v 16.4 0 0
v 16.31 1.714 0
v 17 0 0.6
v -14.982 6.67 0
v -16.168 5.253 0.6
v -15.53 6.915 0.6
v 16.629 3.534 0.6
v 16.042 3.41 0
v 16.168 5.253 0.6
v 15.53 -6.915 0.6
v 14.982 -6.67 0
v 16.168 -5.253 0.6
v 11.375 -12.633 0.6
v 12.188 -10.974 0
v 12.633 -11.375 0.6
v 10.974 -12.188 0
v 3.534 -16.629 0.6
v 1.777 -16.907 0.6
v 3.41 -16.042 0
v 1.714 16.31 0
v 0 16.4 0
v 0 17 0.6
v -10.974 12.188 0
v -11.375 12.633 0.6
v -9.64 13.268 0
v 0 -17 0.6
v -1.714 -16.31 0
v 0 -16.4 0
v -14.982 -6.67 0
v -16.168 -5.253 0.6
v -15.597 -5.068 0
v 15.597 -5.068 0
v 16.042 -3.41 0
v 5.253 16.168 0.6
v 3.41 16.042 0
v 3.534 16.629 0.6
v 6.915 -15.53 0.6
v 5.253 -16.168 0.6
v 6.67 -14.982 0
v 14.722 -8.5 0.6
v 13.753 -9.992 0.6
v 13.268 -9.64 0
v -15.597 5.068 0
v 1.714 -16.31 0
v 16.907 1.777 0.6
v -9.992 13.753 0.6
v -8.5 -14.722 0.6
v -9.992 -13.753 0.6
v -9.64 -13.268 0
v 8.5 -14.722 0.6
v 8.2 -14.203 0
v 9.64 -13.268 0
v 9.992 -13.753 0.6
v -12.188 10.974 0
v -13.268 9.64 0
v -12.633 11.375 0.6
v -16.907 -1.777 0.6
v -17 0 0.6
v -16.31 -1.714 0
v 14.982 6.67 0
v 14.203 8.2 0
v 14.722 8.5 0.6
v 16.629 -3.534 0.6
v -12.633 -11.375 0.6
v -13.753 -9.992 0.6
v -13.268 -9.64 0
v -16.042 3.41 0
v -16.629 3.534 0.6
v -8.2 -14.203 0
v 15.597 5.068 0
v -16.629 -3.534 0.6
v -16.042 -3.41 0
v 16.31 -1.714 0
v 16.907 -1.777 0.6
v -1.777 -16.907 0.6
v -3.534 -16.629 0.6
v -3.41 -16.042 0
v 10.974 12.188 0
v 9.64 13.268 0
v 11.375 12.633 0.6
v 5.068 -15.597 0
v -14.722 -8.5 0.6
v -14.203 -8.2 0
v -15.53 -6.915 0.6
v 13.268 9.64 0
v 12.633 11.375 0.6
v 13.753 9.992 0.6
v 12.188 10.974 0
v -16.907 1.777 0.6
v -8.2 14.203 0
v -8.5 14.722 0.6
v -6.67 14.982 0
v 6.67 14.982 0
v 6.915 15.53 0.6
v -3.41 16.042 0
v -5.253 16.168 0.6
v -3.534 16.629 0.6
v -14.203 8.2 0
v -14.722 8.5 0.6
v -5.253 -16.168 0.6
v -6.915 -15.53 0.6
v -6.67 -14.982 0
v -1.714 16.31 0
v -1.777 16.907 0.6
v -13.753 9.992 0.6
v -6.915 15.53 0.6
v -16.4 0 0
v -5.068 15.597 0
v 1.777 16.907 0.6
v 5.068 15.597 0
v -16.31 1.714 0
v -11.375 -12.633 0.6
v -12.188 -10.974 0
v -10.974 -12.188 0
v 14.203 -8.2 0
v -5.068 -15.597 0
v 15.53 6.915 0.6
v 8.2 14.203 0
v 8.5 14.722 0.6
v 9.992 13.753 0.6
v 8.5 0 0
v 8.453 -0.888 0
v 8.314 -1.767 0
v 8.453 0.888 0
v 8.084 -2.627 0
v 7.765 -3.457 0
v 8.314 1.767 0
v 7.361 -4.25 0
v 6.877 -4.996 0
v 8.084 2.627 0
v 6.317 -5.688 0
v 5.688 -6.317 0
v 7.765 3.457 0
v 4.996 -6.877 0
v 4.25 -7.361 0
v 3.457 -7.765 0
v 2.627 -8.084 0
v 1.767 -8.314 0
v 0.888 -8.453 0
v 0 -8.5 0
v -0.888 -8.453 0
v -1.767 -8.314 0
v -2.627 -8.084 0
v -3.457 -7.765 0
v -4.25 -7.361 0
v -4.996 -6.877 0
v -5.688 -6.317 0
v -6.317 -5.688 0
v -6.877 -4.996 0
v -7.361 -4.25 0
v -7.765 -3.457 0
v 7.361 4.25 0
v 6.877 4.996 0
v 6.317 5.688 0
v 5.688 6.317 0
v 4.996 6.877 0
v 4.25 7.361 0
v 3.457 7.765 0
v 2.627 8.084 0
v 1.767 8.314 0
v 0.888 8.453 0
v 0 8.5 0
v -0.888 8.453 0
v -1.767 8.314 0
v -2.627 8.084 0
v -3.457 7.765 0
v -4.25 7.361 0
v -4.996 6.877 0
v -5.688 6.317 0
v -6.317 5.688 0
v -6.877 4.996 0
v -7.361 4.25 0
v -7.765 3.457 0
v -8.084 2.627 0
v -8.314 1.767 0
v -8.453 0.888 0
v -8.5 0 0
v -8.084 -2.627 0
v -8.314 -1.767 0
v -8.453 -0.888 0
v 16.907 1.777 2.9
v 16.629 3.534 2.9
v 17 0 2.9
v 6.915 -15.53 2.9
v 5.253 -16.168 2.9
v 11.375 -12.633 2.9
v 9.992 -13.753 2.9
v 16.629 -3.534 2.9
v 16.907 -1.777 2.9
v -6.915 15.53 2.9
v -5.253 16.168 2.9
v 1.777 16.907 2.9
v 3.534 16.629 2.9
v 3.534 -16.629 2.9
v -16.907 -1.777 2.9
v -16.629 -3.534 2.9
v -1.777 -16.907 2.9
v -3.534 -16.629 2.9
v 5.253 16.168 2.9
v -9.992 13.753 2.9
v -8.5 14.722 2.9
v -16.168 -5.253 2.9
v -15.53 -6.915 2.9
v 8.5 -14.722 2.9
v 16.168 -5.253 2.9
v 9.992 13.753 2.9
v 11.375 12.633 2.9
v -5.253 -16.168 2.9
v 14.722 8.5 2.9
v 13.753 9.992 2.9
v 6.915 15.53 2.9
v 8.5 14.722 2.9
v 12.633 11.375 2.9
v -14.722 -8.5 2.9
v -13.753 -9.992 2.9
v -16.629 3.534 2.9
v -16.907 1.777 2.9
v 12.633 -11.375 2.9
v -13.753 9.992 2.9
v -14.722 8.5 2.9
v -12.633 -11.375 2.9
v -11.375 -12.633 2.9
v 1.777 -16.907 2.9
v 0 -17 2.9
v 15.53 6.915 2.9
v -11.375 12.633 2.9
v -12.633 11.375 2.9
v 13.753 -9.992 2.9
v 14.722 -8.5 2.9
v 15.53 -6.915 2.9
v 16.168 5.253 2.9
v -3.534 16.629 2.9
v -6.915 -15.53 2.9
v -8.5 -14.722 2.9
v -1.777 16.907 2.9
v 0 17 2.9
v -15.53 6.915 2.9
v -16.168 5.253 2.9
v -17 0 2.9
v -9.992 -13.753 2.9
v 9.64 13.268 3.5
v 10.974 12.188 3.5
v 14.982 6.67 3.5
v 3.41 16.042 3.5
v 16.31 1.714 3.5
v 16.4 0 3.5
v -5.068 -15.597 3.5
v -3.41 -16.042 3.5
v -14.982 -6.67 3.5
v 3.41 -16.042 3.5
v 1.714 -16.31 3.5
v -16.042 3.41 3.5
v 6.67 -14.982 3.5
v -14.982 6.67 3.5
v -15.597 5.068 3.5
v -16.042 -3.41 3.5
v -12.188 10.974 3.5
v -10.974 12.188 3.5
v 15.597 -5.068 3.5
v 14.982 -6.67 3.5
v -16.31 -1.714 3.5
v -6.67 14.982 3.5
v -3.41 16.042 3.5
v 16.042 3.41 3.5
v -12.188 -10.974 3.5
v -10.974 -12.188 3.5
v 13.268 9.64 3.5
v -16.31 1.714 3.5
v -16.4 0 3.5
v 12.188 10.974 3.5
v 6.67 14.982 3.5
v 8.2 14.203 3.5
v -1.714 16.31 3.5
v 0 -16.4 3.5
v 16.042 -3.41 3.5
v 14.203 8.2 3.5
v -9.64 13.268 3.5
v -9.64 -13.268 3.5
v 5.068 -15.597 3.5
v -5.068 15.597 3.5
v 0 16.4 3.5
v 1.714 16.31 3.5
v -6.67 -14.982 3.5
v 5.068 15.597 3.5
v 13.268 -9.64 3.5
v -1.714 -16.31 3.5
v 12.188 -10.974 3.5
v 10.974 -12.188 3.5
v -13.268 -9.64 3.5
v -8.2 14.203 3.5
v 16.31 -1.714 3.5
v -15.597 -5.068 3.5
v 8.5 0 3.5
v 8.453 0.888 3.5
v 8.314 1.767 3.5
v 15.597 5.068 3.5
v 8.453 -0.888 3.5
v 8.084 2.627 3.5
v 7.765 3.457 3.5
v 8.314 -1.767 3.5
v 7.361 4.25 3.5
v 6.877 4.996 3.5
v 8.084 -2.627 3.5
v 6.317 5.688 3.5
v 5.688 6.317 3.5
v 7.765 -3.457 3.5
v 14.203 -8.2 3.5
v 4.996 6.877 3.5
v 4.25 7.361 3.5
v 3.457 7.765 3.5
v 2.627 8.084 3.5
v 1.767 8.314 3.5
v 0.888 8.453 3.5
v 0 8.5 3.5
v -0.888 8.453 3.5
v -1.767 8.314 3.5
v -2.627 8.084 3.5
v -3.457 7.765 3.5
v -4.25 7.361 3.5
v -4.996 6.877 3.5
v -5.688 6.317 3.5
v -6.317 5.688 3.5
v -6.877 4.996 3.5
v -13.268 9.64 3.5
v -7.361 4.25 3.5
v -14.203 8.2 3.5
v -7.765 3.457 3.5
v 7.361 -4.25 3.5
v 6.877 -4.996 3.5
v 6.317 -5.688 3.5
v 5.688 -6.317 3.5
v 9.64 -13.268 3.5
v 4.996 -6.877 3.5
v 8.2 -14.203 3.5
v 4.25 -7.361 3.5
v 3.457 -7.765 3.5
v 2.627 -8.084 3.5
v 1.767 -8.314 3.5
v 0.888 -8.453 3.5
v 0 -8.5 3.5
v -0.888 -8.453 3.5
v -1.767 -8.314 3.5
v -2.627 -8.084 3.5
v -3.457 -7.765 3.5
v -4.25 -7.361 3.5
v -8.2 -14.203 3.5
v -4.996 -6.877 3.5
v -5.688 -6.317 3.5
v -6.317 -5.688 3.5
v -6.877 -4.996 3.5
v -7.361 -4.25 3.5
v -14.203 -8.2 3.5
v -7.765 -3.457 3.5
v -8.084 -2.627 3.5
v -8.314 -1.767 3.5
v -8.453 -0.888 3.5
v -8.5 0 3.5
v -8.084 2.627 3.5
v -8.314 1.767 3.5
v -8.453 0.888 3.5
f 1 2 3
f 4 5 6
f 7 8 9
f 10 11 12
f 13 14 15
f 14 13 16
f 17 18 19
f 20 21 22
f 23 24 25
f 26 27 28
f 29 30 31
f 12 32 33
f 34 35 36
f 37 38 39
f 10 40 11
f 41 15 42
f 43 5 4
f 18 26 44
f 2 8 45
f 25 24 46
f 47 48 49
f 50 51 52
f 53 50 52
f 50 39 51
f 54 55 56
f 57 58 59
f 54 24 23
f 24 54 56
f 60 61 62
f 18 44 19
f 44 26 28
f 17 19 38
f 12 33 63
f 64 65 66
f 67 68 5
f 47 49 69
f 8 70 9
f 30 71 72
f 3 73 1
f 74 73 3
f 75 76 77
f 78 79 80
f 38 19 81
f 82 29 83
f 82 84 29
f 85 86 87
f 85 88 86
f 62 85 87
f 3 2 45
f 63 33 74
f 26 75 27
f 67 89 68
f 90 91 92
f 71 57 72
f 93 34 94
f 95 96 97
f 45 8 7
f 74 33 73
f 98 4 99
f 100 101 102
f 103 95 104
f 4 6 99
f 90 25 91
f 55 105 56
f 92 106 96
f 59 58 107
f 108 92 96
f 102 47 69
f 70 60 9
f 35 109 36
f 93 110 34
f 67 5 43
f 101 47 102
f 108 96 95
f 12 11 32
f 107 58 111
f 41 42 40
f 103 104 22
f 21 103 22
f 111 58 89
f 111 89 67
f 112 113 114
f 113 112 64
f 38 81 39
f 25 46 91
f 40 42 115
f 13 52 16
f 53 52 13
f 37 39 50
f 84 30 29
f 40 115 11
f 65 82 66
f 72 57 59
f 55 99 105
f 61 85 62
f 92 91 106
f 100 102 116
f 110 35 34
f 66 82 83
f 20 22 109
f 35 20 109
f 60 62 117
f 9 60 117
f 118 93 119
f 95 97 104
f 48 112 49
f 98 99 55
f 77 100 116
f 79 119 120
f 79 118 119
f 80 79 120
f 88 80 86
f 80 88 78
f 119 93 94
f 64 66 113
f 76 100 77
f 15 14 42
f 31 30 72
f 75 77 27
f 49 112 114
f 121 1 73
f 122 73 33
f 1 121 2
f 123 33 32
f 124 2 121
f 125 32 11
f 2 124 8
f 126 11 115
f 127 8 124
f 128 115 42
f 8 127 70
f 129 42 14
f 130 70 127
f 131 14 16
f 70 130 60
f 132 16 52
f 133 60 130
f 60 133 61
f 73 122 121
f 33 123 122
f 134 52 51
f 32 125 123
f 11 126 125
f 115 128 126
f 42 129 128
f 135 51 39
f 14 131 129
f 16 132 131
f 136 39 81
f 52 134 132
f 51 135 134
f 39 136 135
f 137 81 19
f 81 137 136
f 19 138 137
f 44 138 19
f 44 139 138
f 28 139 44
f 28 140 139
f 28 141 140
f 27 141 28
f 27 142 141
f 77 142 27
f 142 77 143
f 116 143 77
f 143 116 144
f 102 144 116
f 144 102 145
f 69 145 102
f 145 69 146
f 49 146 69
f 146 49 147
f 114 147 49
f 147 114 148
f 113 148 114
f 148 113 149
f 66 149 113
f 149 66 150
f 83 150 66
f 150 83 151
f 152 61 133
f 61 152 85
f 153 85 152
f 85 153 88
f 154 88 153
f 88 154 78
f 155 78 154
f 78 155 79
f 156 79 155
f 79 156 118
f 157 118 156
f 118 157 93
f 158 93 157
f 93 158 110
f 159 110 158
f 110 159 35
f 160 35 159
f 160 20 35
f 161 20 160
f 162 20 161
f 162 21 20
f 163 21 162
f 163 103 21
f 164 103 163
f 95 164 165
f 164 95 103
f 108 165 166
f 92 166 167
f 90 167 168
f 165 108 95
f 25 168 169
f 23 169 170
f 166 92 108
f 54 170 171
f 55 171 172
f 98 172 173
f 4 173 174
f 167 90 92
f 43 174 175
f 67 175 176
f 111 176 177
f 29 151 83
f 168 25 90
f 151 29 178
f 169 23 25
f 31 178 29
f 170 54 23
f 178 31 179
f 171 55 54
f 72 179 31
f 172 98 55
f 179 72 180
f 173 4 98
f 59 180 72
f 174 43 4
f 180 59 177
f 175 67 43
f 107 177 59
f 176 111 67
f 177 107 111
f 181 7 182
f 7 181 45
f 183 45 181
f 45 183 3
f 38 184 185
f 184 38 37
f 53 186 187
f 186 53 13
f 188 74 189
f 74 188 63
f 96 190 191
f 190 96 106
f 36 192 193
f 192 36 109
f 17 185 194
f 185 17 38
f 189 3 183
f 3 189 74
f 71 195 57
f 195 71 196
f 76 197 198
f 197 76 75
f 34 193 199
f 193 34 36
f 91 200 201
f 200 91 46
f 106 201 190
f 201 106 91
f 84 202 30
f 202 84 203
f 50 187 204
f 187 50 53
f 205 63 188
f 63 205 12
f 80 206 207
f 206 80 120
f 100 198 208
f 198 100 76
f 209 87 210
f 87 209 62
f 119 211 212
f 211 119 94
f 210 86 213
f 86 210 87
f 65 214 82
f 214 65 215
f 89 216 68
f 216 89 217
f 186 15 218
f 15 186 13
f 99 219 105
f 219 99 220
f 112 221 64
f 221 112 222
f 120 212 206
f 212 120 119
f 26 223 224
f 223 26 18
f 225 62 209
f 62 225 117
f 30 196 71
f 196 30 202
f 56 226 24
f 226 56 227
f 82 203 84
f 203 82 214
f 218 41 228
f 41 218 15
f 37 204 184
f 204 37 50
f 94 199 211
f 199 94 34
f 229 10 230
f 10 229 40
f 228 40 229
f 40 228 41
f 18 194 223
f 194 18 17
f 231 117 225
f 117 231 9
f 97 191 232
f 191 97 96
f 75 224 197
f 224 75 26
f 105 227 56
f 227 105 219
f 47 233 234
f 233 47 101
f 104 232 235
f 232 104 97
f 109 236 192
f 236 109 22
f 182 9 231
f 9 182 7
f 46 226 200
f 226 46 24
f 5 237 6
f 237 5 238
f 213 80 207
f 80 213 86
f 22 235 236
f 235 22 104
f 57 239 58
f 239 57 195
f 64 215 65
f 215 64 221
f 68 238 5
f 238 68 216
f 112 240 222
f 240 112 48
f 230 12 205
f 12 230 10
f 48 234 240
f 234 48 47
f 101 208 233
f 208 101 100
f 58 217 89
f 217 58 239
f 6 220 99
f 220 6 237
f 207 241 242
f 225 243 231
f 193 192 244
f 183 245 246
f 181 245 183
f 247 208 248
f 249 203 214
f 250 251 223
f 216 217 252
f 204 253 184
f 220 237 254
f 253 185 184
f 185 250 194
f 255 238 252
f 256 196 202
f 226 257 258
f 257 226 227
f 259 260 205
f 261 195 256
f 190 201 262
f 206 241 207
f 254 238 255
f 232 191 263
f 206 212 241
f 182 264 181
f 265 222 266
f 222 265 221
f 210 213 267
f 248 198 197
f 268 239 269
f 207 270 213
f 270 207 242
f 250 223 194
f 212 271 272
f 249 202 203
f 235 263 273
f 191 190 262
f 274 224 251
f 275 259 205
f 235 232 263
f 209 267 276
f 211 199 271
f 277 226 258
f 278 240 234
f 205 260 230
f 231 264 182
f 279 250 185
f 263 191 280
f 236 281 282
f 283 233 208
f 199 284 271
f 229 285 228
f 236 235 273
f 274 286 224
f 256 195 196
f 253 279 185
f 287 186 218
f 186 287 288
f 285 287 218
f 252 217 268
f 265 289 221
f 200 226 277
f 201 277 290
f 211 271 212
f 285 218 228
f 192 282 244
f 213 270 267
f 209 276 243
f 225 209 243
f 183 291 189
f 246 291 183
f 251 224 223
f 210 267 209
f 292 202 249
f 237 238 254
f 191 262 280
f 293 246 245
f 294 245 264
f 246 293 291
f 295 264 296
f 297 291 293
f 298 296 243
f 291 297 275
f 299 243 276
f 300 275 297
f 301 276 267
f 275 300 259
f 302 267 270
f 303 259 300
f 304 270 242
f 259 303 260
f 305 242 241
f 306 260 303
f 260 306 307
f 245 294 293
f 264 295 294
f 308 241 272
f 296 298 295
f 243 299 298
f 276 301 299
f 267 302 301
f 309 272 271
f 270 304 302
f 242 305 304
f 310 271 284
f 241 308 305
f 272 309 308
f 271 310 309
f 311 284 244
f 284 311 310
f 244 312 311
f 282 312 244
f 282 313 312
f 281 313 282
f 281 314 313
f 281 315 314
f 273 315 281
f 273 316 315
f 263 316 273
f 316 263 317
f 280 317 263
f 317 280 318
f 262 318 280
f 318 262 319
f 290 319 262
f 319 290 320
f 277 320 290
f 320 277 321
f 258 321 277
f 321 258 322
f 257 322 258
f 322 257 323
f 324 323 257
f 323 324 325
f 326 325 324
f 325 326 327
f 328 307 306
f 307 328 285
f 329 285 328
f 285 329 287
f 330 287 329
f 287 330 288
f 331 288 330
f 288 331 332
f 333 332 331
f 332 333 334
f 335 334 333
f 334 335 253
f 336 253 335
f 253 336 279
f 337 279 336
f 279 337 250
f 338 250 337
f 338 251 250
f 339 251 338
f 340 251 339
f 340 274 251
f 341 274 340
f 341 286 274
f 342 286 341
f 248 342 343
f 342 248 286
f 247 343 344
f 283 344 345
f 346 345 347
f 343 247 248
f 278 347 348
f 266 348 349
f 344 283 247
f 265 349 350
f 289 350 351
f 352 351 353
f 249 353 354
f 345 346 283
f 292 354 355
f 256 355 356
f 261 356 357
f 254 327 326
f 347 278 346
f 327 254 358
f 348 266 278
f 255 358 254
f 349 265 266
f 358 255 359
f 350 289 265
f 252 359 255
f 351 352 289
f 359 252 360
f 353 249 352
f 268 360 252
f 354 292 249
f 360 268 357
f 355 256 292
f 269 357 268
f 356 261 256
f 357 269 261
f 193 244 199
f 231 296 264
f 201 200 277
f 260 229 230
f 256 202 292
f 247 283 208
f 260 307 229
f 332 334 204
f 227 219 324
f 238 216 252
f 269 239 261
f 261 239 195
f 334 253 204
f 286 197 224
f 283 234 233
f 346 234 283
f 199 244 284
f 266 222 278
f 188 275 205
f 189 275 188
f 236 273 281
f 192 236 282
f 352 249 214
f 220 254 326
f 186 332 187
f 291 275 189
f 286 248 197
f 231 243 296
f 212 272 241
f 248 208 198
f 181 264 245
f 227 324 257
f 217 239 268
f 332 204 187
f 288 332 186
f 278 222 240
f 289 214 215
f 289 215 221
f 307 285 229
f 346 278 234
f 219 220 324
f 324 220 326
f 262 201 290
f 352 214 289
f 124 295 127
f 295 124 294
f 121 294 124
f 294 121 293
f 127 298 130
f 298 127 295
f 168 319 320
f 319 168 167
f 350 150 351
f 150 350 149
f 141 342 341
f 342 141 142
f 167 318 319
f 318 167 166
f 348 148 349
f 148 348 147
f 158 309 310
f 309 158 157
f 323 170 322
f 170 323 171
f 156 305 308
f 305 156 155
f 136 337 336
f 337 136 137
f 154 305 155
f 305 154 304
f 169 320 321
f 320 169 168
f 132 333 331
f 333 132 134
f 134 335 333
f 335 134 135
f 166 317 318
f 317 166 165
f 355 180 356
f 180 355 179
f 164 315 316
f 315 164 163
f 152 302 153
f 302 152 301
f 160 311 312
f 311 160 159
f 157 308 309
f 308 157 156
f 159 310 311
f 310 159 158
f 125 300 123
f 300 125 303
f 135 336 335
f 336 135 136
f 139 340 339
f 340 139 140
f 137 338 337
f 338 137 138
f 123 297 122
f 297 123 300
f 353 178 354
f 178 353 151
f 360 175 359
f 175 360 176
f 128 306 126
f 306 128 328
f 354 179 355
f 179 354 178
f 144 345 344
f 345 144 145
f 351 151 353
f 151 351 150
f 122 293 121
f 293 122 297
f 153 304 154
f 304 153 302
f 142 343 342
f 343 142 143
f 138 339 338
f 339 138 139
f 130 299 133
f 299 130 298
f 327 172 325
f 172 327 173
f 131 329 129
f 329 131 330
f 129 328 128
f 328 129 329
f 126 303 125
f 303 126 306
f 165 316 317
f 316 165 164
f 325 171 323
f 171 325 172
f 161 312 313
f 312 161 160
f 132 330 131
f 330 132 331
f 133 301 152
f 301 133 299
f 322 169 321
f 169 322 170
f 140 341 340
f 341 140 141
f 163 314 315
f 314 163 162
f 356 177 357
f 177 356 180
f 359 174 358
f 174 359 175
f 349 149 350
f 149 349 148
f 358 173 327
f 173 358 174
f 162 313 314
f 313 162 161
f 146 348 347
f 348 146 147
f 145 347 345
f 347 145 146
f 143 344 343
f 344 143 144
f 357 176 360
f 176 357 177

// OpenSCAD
// Chamfered metric washer.
$fn = 60;
eps = 0.02;
inner_d = 17;
outer_d = 34;
thickness = 3.5;
chamfer = 0.6;
difference() {
    union() {
        cylinder(d1 = outer_d - 2 * chamfer, d2 = outer_d, h = chamfer);
        translate([0, 0, chamfer]) cylinder(d = outer_d, h = thickness - 2 * chamfer);
        translate([0, 0, thickness - chamfer]) cylinder(d1 = outer_d, d2 = outer_d - 2 * chamfer, h = chamfer);
    }
    translate([0, 0, -eps]) cylinder(d = inner_d, h = thickness + 2 * eps);
}
